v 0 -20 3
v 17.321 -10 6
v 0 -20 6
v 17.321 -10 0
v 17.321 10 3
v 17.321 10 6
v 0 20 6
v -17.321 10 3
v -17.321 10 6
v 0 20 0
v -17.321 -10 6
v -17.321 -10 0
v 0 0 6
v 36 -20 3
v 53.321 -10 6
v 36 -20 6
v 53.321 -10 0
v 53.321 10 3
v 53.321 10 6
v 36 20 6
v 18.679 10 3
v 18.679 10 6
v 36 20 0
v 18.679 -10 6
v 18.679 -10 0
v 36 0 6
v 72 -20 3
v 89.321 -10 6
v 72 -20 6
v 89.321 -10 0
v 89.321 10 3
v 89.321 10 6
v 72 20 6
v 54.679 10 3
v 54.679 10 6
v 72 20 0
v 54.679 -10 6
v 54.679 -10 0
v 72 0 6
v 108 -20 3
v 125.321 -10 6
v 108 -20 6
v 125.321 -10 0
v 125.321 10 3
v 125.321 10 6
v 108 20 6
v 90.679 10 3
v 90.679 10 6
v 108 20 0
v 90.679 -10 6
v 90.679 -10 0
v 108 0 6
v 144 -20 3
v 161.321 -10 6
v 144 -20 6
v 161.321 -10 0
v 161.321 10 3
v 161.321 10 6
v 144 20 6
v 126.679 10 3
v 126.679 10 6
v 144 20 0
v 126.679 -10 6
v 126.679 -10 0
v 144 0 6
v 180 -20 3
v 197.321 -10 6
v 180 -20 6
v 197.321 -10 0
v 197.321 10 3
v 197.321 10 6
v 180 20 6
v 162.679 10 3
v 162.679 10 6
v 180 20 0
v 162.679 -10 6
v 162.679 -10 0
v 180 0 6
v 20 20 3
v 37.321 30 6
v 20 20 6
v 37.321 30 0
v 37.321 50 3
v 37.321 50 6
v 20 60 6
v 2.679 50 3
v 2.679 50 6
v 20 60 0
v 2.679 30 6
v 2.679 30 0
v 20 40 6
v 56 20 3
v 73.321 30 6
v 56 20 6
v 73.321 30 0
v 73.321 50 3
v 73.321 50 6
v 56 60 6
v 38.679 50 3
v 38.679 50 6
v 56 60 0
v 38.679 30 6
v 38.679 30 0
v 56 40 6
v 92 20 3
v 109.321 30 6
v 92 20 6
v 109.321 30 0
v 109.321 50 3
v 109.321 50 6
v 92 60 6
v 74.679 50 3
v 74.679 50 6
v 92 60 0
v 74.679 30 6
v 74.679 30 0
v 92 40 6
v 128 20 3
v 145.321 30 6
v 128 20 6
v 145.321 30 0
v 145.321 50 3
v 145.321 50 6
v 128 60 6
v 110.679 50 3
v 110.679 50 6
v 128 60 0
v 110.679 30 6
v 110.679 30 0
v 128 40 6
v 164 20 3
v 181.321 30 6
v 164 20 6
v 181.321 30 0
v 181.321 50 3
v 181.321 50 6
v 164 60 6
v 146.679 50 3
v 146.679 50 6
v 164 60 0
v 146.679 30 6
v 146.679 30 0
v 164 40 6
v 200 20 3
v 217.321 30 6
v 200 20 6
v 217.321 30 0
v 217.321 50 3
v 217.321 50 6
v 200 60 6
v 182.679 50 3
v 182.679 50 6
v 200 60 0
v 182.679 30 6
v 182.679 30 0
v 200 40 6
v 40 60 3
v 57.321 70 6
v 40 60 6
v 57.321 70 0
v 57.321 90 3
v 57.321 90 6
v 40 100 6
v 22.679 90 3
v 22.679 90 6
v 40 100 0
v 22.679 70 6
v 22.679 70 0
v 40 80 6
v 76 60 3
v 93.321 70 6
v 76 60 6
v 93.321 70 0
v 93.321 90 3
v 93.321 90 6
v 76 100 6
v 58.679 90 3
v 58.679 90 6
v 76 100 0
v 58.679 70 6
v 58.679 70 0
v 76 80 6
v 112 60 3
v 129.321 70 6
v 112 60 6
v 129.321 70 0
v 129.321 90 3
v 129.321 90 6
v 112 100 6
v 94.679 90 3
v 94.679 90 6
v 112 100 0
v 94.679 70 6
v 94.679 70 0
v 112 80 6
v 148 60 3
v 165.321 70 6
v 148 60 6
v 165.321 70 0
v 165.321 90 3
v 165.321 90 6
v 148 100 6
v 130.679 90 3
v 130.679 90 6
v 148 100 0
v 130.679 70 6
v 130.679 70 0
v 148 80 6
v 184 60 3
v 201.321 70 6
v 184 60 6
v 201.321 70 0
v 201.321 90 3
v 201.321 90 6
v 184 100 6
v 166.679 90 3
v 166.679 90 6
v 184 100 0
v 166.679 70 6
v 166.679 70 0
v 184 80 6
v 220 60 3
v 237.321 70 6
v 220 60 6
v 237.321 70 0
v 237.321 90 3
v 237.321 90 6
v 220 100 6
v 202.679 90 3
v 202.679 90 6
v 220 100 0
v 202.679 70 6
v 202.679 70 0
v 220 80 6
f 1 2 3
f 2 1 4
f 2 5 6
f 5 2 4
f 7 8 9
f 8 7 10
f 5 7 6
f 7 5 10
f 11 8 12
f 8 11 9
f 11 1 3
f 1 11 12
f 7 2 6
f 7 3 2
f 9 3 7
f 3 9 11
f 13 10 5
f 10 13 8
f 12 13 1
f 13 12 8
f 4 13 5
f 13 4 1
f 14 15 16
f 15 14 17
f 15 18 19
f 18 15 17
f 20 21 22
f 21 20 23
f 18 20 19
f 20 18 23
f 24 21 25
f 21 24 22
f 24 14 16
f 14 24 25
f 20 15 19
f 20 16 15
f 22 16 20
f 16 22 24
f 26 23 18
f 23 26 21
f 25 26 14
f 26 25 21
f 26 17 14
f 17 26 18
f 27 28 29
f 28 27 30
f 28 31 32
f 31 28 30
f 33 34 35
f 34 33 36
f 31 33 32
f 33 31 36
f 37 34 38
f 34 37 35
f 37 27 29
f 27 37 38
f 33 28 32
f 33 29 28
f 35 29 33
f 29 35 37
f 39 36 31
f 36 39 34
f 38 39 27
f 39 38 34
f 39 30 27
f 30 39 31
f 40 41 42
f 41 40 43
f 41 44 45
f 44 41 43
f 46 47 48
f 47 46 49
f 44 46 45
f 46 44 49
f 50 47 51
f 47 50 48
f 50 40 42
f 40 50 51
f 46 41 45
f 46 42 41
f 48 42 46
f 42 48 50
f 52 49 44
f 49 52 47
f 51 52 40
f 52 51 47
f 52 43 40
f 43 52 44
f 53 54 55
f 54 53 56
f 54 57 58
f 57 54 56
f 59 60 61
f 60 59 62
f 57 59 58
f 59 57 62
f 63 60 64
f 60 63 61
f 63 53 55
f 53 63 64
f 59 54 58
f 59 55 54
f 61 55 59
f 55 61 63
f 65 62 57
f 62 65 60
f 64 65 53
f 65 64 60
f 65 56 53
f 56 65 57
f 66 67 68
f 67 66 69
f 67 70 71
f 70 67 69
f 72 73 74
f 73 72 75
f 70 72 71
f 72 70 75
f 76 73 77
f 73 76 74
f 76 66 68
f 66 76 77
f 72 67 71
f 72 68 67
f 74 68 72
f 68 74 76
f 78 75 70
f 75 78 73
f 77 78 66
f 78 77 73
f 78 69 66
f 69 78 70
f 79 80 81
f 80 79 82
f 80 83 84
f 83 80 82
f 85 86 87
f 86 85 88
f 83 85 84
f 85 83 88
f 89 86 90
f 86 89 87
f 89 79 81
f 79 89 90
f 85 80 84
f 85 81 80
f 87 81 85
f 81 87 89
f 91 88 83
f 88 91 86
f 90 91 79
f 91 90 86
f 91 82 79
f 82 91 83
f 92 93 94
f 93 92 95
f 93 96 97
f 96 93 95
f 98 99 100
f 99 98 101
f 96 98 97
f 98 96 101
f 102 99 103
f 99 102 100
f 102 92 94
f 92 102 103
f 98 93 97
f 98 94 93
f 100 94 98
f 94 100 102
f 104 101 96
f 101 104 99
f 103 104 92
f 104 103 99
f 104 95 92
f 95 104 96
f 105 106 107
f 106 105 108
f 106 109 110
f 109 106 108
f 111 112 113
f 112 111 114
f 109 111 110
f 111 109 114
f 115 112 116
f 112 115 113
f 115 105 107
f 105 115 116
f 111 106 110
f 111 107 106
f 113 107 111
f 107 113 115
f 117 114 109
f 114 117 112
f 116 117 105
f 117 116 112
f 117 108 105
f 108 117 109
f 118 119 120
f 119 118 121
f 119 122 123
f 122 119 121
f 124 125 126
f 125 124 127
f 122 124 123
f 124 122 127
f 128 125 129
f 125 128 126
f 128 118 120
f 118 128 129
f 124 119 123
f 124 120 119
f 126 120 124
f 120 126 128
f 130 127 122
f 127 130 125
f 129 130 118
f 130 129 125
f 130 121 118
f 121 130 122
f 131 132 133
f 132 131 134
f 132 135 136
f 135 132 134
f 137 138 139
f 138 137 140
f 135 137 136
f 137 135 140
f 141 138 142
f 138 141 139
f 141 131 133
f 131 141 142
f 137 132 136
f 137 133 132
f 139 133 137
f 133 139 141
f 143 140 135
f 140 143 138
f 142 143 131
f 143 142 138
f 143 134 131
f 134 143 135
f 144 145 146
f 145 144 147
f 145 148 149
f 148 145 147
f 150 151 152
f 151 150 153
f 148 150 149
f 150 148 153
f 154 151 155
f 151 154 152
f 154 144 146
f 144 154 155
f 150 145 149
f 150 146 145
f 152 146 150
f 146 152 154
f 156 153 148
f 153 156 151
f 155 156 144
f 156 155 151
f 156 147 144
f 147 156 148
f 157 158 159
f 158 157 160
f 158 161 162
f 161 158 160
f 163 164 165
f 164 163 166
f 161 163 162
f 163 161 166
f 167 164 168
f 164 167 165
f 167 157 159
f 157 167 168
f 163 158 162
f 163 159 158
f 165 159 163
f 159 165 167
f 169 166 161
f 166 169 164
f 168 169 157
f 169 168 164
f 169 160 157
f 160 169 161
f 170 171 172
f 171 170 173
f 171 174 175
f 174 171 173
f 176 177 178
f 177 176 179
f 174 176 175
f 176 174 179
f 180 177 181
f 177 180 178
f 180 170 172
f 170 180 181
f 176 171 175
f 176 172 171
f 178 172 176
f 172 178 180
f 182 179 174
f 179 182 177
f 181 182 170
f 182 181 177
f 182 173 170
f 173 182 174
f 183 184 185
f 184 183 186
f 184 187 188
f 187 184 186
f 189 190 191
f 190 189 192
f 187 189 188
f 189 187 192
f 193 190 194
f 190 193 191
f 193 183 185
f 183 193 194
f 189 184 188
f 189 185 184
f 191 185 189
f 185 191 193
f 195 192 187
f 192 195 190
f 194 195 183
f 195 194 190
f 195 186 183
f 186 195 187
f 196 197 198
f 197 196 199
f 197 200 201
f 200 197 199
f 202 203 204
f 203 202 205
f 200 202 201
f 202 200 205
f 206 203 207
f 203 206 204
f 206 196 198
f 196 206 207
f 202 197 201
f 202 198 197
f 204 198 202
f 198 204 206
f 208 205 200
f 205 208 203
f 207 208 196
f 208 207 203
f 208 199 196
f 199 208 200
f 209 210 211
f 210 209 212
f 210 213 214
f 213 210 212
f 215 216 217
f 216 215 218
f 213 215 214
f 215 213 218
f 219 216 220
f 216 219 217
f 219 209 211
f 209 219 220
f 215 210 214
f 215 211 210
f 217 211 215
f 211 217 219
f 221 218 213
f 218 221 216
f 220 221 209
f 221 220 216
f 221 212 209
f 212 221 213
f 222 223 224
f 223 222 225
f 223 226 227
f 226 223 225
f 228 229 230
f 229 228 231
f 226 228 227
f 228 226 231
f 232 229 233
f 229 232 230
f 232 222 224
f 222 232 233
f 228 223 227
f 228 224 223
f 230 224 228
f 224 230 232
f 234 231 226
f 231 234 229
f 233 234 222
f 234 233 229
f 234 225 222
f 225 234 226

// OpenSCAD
for ( y = [0 : 2] )

translate([0,y*40,0])

for ( x = [0 : 5] ){

translate([y*1/2*40 + x*40*0.9,0,0]){
rotate([0,0,30])difference(){
translate([0,0,0])#cylinder($fn=6,h=6,r1=20,r2=20);
translate([0,0,0]) cylinder($fn=3,h=6,r1=40,r2=0);
}
}
}
